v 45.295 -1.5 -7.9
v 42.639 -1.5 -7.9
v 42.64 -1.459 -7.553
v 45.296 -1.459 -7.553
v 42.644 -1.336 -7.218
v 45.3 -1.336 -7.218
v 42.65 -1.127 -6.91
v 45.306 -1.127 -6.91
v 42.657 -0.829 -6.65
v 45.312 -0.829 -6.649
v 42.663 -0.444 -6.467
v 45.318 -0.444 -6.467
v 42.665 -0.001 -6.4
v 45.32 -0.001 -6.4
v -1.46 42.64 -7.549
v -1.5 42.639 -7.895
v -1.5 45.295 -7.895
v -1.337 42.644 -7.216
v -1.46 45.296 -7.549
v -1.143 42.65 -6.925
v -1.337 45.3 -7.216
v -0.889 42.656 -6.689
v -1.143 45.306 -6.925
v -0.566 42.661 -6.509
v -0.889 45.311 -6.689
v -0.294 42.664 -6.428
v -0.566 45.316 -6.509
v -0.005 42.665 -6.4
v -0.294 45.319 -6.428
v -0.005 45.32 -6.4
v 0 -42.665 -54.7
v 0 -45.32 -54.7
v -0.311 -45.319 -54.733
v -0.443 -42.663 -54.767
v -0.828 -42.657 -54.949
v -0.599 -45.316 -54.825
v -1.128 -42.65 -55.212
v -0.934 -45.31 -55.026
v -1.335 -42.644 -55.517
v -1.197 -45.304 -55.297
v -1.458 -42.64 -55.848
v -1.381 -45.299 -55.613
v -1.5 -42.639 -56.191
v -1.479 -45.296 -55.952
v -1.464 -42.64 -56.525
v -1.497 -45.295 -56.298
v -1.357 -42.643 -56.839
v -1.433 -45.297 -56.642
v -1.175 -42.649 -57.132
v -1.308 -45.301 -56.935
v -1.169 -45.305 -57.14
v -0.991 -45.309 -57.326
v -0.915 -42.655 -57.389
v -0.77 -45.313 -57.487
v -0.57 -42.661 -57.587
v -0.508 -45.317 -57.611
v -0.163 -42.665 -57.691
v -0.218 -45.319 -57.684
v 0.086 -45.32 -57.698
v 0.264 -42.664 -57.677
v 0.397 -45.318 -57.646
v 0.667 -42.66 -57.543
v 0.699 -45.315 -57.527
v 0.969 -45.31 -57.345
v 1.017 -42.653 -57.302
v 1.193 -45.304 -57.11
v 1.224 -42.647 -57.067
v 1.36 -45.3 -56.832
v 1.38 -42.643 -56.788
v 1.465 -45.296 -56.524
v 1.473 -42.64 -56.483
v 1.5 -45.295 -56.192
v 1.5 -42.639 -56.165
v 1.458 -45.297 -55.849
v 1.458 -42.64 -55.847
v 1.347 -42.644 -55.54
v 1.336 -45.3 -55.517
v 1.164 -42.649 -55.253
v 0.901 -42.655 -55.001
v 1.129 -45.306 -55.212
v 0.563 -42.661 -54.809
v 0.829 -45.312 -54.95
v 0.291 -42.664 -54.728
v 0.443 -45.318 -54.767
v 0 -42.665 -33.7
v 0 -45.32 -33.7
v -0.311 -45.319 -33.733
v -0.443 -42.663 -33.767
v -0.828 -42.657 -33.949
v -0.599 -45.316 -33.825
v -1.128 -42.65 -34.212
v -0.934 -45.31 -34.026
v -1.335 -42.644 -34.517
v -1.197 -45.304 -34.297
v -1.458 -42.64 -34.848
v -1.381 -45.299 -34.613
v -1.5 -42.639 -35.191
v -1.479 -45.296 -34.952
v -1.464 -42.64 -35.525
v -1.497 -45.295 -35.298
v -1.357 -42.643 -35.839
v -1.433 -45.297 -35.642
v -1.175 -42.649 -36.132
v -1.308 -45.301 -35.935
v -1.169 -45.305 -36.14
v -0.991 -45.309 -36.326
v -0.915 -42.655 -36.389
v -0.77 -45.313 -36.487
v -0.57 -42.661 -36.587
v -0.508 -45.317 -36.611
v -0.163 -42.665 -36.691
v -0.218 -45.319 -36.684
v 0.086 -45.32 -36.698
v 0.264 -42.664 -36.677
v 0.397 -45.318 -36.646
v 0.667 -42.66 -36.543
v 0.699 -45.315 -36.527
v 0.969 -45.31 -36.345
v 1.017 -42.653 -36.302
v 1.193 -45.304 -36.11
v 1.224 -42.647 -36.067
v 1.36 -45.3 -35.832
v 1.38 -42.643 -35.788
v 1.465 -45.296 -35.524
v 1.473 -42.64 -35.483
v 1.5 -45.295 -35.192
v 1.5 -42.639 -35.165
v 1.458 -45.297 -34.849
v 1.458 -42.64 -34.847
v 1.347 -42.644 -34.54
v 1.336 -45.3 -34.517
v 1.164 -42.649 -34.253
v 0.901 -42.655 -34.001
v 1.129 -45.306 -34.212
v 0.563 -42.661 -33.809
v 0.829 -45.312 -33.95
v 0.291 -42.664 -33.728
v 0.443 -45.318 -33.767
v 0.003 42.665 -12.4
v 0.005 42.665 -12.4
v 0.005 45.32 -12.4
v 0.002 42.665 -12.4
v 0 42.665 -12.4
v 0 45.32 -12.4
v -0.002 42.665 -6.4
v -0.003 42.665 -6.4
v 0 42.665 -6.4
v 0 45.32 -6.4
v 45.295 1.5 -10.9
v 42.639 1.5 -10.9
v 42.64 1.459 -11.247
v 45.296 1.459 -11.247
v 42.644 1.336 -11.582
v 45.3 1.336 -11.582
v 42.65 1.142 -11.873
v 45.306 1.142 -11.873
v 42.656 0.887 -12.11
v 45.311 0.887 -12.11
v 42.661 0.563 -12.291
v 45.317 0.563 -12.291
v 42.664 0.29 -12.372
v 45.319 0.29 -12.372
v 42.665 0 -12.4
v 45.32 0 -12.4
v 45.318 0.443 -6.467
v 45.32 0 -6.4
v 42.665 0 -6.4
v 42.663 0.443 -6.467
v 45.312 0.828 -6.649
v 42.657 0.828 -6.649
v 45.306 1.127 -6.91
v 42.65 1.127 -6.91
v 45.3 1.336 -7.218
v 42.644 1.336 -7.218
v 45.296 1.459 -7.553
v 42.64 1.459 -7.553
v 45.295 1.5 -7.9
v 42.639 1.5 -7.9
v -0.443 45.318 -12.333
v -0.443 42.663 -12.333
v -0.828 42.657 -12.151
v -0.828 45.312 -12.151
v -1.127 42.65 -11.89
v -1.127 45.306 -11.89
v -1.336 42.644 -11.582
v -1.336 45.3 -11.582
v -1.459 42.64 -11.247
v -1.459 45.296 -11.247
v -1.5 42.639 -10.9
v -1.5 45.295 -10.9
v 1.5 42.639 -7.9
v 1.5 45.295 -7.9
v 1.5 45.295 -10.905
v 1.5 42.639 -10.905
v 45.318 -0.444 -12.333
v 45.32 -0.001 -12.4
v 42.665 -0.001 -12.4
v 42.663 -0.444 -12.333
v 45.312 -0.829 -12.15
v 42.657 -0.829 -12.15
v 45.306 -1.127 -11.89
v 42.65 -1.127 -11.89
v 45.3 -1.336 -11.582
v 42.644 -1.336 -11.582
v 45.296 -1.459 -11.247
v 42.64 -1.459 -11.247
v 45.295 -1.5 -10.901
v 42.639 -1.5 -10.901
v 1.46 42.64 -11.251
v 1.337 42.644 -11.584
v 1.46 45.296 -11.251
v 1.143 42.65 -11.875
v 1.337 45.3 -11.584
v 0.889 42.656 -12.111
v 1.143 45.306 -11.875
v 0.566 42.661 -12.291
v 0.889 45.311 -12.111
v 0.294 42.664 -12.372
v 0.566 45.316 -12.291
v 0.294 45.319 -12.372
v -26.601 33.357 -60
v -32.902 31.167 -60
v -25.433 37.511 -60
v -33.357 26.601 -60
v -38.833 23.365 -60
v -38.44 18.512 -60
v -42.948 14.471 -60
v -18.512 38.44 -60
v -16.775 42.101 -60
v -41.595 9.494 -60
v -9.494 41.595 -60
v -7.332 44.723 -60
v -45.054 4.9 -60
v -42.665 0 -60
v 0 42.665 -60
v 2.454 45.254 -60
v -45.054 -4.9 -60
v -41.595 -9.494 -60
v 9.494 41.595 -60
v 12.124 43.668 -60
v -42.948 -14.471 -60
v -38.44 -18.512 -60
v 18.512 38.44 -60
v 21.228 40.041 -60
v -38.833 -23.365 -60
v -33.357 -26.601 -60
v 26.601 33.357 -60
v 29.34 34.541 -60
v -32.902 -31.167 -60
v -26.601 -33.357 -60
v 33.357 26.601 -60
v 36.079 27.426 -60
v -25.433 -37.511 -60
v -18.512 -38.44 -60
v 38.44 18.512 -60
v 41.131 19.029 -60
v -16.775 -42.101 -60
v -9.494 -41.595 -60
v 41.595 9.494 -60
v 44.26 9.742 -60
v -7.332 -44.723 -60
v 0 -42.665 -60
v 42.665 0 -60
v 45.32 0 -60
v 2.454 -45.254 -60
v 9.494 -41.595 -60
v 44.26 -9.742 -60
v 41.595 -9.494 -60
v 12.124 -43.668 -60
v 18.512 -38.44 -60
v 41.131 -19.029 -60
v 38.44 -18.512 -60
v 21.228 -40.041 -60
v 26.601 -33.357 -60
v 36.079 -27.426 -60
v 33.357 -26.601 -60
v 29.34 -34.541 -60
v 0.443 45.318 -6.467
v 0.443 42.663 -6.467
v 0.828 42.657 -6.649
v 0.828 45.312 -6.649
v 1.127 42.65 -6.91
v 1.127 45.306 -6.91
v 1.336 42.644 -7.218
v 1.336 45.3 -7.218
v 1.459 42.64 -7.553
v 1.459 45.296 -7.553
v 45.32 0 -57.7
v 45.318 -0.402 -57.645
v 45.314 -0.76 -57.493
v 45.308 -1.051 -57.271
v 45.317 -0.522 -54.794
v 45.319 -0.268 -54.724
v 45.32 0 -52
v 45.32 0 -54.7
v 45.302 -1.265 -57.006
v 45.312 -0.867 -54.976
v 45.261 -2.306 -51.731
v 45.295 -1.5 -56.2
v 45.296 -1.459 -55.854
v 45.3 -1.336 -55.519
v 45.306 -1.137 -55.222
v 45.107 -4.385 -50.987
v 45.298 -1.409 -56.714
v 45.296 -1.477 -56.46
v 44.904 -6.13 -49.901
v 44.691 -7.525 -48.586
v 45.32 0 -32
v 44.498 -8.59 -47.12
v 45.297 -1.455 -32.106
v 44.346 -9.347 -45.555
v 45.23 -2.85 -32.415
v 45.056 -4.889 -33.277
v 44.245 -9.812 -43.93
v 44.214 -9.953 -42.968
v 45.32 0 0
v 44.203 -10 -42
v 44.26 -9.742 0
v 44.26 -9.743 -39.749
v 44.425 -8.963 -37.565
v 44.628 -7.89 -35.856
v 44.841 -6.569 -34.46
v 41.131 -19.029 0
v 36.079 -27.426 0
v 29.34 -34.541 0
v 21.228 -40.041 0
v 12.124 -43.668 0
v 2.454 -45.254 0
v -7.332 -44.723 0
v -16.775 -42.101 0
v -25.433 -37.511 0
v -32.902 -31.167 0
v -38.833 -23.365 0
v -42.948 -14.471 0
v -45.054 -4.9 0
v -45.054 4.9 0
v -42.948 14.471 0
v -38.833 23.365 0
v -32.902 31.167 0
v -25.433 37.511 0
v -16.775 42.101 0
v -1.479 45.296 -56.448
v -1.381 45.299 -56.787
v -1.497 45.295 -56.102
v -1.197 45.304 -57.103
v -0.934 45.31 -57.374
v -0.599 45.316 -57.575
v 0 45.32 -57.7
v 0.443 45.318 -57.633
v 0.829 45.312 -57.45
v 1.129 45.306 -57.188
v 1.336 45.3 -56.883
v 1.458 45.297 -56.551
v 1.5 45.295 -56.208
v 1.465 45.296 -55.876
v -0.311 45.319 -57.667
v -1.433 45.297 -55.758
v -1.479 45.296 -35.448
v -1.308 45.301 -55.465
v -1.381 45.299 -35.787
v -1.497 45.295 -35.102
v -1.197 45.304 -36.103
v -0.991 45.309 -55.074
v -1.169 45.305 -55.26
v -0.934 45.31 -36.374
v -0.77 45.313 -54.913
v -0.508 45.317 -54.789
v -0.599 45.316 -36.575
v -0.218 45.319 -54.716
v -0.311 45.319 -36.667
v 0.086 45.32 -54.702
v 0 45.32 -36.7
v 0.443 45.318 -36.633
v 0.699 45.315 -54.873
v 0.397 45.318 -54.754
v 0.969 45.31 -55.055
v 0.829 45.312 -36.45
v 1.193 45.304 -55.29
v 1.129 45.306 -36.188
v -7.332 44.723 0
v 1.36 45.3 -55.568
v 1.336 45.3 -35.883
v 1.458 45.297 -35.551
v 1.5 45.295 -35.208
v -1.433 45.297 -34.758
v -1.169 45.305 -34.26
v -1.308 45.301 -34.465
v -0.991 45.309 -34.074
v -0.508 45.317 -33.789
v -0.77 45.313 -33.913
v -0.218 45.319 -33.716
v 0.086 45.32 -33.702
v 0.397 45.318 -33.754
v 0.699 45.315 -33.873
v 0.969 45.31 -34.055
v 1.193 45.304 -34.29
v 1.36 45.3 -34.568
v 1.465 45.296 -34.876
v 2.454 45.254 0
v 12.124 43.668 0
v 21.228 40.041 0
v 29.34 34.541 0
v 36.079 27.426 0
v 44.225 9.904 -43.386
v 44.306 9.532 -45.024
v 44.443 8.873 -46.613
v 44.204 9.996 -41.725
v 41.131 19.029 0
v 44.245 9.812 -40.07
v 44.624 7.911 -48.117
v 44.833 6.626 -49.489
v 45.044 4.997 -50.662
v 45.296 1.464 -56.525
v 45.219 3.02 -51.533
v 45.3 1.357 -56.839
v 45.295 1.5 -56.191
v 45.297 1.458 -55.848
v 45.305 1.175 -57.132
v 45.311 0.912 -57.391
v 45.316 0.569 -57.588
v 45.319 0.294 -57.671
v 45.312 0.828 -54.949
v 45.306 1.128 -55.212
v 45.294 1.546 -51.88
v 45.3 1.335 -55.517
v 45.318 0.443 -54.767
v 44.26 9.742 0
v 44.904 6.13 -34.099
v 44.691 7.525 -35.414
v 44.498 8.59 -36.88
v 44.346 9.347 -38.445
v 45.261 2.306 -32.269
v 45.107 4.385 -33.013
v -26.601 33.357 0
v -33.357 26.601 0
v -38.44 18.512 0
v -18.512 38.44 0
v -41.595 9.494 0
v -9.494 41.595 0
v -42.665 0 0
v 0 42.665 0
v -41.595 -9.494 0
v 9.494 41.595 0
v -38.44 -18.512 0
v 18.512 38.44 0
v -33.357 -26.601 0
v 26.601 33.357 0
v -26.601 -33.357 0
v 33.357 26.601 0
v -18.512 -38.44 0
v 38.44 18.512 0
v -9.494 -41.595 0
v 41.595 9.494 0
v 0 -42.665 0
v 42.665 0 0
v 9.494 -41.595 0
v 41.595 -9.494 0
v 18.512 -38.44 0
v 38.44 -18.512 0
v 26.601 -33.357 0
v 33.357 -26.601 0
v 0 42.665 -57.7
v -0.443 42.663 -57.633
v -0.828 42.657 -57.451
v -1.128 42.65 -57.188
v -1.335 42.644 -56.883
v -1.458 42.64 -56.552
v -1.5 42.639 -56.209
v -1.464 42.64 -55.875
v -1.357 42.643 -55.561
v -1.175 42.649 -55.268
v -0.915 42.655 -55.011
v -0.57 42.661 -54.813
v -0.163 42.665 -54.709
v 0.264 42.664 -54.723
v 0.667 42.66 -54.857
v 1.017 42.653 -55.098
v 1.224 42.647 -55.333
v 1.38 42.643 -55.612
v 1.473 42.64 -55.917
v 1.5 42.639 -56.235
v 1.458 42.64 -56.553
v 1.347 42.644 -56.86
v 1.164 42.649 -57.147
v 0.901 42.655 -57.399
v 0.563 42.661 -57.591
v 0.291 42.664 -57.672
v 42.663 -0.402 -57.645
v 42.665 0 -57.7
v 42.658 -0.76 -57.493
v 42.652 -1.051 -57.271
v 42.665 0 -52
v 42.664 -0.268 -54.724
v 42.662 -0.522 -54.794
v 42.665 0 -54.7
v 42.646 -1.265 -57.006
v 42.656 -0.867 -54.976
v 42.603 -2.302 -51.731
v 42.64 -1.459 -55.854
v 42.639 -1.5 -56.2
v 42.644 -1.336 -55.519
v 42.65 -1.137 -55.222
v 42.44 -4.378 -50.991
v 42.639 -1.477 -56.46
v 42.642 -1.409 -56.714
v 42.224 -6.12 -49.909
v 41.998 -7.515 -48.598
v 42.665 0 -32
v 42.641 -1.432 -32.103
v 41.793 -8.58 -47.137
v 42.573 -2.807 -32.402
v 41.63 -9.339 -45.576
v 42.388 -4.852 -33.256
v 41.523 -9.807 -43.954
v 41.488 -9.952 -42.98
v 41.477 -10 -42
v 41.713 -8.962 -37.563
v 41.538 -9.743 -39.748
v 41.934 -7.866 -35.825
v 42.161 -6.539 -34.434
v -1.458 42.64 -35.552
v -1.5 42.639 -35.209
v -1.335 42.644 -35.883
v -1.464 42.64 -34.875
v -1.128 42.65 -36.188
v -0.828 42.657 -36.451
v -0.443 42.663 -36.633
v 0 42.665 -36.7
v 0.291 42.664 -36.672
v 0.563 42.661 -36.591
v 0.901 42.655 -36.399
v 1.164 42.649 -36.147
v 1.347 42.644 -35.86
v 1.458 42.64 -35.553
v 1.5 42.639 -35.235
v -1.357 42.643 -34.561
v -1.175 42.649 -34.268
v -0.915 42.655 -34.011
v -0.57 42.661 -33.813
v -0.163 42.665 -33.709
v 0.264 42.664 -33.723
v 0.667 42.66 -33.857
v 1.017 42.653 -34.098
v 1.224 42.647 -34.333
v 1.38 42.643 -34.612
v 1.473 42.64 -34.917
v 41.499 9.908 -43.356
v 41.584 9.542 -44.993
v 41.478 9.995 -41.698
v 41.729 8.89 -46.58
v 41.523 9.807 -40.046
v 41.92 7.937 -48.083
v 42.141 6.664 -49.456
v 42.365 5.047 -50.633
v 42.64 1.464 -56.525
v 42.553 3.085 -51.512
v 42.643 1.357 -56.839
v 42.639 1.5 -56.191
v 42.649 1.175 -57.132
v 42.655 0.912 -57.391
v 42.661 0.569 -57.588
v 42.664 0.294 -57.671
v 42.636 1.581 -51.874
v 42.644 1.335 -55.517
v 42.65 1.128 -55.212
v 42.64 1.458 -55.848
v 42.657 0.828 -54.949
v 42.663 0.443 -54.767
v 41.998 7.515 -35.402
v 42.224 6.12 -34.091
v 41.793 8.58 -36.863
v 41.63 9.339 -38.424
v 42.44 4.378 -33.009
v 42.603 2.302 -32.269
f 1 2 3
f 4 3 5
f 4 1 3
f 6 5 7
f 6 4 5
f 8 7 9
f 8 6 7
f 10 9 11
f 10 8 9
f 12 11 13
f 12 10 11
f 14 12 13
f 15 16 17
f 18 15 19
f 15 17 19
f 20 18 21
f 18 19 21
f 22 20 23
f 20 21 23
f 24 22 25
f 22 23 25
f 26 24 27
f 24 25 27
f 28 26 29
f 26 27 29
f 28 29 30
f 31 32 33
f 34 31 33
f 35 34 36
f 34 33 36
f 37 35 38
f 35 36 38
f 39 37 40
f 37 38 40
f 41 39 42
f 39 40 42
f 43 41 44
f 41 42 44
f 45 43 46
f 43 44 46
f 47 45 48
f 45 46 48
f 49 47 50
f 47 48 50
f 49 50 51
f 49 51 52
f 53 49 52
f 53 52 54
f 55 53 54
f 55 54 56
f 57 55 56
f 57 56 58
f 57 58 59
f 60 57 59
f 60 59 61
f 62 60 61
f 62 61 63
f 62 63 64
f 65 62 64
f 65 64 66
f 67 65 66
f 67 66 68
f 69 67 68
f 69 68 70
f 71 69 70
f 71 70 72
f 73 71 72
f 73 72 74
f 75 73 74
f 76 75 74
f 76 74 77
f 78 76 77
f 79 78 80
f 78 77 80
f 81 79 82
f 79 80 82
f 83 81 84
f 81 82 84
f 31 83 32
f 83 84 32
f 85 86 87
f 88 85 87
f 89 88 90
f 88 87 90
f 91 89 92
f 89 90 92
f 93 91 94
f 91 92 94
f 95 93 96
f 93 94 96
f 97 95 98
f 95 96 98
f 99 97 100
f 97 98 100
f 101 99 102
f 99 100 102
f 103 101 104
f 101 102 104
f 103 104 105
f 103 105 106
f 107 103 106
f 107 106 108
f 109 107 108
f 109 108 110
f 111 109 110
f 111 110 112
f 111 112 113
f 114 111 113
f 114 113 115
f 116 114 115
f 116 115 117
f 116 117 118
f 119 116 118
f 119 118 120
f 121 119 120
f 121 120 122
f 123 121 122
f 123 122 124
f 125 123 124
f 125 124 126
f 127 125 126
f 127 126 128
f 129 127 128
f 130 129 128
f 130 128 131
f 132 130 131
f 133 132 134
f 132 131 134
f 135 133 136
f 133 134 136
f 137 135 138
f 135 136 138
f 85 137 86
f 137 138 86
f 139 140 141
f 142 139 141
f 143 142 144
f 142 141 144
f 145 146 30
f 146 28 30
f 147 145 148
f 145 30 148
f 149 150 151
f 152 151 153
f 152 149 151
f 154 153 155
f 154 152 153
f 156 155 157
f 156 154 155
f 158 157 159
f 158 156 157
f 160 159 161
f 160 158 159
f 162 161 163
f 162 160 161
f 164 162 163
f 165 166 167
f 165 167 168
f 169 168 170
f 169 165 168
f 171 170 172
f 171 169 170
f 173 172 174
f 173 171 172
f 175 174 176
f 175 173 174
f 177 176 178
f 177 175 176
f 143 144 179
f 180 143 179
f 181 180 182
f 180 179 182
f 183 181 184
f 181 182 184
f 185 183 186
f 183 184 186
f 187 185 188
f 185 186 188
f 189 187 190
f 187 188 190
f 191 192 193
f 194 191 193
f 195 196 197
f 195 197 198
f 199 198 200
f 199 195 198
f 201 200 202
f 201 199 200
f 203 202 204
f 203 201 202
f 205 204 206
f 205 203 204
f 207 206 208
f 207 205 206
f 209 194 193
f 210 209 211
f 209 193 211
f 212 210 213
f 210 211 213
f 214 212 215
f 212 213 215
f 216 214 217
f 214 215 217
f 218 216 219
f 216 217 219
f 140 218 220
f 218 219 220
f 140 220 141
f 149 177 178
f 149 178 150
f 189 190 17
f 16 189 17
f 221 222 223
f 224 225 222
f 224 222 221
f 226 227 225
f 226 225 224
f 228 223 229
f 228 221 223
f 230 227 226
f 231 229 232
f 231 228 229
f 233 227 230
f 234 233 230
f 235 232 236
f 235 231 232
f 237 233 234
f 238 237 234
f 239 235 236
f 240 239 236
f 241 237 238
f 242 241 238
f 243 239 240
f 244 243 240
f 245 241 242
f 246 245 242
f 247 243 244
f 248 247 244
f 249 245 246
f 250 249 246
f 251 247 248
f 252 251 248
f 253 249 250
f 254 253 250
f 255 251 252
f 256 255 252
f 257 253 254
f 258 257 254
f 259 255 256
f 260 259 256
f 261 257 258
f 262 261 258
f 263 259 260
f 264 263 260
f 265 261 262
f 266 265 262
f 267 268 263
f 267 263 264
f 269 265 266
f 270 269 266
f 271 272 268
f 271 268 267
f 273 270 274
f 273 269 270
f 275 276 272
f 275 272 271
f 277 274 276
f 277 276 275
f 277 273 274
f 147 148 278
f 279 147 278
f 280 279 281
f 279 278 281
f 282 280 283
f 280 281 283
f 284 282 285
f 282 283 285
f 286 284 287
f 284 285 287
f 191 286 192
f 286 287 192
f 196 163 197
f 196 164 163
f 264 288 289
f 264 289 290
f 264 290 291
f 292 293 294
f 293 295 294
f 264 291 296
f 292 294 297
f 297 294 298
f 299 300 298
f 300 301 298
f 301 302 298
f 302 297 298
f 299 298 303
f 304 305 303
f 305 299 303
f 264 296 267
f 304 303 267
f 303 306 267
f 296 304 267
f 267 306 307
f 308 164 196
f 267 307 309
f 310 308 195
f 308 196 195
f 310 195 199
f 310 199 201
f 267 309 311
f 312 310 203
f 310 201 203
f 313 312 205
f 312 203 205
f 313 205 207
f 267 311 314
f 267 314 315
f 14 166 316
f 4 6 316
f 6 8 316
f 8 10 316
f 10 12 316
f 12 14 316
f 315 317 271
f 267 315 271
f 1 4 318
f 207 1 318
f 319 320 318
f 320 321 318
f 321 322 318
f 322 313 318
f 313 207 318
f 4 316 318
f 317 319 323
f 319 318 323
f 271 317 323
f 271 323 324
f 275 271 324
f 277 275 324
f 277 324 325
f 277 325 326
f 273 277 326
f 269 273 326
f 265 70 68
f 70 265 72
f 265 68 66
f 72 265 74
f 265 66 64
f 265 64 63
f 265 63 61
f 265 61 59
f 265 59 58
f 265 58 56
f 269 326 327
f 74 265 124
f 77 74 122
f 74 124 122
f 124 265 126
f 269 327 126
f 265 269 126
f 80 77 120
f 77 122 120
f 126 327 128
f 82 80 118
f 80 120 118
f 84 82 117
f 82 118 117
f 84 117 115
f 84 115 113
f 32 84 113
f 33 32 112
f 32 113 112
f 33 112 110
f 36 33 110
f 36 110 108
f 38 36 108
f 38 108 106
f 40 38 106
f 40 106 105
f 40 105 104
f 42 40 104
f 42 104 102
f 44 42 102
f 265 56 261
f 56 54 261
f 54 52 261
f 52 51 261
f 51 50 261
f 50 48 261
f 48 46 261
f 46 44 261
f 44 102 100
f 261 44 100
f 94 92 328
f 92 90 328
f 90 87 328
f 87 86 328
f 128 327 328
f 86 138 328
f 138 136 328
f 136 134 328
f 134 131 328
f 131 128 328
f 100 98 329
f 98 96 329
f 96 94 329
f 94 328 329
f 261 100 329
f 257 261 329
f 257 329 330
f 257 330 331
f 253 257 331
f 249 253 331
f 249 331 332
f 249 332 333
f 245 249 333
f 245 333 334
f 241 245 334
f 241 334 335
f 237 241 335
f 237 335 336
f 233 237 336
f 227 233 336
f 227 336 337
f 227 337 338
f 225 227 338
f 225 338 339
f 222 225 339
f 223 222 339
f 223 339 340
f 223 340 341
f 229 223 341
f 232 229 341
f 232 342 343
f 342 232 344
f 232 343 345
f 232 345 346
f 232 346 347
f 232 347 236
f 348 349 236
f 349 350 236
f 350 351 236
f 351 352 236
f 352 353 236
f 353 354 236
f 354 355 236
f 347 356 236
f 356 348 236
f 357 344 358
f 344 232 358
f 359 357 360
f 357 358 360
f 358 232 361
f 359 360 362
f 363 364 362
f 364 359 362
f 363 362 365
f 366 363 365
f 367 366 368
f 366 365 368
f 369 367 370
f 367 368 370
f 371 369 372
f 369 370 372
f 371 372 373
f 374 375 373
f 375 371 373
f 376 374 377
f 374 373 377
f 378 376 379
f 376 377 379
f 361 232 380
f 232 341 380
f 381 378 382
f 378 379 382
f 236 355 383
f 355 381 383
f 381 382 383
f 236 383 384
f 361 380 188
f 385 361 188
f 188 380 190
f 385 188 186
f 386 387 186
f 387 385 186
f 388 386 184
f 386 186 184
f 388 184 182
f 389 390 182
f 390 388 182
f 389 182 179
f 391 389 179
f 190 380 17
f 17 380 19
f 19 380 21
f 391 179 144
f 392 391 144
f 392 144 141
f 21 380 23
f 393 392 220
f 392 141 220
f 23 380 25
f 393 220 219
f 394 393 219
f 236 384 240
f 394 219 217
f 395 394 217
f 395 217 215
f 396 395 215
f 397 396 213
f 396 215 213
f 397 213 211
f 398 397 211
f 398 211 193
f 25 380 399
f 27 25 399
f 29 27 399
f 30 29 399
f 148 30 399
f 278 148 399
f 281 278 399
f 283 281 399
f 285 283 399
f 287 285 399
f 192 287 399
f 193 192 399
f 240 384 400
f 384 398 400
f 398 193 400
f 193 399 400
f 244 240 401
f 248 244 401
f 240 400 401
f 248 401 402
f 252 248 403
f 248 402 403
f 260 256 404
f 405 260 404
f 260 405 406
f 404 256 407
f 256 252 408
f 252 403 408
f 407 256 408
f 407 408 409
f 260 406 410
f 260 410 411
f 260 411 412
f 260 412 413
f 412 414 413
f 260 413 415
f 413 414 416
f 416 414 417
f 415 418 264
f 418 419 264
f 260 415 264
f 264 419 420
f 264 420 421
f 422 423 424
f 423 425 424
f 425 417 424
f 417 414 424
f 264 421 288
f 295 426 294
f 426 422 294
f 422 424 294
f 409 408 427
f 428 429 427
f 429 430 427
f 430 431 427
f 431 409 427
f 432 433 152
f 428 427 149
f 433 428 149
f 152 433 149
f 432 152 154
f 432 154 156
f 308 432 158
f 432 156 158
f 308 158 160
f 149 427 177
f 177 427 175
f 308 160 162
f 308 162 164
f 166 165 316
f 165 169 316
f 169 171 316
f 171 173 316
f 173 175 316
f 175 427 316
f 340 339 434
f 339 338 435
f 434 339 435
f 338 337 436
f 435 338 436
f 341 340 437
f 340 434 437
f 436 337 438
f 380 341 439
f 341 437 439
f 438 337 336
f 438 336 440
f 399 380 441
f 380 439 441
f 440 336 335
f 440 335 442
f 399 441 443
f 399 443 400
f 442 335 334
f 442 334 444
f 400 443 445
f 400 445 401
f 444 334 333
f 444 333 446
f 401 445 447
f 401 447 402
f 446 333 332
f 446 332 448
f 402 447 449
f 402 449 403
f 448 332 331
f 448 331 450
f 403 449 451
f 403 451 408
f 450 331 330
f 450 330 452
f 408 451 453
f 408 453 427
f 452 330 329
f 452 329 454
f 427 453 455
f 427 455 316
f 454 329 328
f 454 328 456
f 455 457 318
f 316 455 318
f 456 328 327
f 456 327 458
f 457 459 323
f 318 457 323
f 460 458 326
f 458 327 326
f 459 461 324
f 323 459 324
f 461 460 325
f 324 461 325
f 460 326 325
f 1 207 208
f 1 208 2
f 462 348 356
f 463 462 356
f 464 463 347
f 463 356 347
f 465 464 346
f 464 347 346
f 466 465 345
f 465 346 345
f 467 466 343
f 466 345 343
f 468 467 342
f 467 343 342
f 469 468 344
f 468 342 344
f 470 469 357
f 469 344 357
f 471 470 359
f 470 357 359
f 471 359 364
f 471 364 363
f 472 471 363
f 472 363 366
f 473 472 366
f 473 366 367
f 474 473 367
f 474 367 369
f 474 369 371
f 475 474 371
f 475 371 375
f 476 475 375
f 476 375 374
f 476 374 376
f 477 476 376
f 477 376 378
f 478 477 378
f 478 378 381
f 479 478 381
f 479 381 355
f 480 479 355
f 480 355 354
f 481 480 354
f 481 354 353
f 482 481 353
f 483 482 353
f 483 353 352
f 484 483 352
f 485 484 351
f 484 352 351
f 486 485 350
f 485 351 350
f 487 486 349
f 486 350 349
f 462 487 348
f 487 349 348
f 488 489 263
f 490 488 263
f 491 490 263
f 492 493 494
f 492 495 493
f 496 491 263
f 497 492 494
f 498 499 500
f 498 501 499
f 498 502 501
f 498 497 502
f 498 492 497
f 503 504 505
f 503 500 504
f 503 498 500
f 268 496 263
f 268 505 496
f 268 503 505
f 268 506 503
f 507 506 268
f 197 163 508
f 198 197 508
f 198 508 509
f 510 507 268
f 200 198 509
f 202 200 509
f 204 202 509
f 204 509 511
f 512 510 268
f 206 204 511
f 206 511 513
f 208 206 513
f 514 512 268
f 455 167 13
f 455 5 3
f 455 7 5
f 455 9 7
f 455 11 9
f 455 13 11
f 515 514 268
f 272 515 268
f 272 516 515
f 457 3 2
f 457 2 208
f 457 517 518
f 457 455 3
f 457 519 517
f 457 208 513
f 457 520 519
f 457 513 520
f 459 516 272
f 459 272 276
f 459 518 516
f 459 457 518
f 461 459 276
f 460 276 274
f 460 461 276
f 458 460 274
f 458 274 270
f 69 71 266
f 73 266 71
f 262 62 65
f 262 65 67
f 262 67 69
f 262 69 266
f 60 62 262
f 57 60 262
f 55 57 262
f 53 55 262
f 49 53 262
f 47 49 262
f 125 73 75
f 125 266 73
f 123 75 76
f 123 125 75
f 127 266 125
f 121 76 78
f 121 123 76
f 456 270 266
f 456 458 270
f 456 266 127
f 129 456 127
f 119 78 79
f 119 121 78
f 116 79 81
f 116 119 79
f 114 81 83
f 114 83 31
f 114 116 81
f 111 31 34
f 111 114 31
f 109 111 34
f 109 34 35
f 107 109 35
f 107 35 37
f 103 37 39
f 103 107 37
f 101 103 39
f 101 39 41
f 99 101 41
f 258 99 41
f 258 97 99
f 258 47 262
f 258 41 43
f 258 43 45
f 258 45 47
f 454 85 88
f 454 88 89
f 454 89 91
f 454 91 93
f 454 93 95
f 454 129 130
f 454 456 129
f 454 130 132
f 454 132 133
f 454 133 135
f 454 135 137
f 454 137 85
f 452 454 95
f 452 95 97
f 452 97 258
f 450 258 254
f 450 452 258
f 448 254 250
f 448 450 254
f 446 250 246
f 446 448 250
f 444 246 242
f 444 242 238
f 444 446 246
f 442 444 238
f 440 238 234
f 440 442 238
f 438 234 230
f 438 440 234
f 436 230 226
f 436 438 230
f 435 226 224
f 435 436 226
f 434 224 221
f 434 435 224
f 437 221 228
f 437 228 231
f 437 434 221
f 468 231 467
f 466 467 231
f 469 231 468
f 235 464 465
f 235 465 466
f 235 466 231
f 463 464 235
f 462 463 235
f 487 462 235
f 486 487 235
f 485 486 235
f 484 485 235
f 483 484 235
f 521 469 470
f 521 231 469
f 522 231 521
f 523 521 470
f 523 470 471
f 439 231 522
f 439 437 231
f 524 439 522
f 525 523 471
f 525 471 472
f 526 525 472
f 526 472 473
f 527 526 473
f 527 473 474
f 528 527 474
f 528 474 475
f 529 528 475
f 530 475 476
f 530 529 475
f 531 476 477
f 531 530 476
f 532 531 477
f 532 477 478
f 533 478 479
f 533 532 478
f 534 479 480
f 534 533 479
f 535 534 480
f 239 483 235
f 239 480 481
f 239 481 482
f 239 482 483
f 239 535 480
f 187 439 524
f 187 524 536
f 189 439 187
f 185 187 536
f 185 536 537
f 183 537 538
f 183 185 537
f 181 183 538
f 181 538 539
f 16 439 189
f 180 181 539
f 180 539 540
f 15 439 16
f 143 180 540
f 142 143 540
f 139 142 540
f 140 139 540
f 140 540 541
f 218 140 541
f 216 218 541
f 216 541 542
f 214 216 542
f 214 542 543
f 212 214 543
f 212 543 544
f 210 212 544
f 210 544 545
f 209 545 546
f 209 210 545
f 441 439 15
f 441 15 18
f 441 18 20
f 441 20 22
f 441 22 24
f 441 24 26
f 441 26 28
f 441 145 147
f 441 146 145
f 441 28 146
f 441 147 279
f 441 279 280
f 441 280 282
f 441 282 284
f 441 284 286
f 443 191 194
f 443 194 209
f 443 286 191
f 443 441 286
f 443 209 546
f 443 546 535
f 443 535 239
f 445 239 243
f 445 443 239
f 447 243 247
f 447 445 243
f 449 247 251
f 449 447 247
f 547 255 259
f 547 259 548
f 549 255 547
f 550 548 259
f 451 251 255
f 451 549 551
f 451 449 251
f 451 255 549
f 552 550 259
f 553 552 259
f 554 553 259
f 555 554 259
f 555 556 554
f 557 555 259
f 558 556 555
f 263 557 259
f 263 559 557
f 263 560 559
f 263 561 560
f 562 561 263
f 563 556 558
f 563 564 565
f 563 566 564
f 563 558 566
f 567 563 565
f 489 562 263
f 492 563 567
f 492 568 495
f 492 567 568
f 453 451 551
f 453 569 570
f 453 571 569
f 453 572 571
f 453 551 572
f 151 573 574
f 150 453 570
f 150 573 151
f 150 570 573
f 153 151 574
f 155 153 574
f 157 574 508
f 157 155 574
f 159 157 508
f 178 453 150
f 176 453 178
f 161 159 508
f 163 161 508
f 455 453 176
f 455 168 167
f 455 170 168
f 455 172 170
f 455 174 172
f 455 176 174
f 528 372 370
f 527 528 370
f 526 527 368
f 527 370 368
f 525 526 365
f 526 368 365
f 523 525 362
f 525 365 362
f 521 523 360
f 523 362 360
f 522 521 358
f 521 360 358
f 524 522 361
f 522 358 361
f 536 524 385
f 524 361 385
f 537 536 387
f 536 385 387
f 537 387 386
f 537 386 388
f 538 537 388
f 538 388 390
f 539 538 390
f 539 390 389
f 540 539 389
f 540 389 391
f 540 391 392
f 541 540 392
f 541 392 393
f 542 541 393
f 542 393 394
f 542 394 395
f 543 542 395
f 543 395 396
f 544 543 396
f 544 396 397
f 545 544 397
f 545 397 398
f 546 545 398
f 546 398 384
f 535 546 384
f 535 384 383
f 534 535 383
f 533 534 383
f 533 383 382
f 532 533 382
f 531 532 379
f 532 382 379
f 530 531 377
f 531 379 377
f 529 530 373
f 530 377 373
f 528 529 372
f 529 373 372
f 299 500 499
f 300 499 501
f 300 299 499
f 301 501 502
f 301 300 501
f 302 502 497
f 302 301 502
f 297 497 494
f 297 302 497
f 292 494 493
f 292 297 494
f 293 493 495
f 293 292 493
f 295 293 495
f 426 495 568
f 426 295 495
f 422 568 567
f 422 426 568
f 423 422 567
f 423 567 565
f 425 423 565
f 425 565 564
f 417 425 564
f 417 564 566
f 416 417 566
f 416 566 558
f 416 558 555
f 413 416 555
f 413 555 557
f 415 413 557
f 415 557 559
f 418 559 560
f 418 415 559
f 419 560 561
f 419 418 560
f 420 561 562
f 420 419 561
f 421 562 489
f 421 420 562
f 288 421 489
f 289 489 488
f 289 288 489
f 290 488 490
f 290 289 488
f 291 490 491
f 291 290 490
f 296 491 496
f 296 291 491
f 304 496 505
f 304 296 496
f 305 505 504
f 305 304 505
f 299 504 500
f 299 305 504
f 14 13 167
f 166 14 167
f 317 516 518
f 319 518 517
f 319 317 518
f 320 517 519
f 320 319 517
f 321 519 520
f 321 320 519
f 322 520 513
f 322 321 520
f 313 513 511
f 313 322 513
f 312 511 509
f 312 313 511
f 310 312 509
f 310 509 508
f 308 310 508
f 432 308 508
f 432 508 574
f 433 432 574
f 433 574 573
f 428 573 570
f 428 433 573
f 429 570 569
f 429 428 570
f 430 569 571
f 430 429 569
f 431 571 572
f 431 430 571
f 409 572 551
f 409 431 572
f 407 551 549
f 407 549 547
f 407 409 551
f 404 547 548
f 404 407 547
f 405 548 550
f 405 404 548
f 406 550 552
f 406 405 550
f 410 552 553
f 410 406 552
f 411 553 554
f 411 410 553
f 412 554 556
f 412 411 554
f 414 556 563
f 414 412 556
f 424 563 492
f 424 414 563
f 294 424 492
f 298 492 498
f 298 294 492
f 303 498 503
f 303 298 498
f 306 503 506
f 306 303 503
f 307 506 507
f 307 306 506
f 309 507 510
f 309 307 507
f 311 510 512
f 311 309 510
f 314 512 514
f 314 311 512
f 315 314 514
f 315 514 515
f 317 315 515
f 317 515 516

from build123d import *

# Parameters (mm, degrees)
SKETCH_R             = 45.32
SKETCH_R_2           = 42.665
PAD_DEPTH            = 60
SKETCH002_R          = 1.5
SKETCH002_R_2        = 10
POCKET_DEPTH         = 8
SKETCH003_R          = 1.5
POCKET001_DEPTH      = 8
SKETCH004_R          = 1.5
POCKET002_DEPTH      = 5
BODY_PLACEMENT_ANGLE = 180


with BuildPart() as part:
    # Sketch → Pad (new body)
    with BuildSketch(Plane.XY):
        Circle(SKETCH_R)
        Circle(SKETCH_R_2, mode=Mode.SUBTRACT)
    extrude(amount=PAD_DEPTH)

    # Sketch002 (on DatumPlane) → Pocket (cut)
    with BuildSketch(Plane(origin=(45.32, 0, 60), x_dir=(0, 1, 0), z_dir=(-1, 0, 0))):
        with Locations((0, 3.8)):
            Circle(SKETCH002_R)
        with Locations((0, 18)):
            Circle(SKETCH002_R_2)
        with BuildLine():
            Line((0, 47.6), (0.0005, 47.6))
            ThreePointArc((0.0005, 47.6), (1.060807, 48.039193), (1.5, 49.0995))
            Line((1.5, 49.0995), (1.5, 52.1005))
            ThreePointArc((1.5, 52.1005), (1.060807, 53.160807), (0.0005, 53.6))
            Line((0.0005, 53.6), (0, 53.6))
            ThreePointArc((0, 53.6), (-1.06066, 53.16066), (-1.5, 52.1))
            Line((-1.5, 52.1), (-1.5, 49.1))
            ThreePointArc((-1.5, 49.1), (-1.06066, 48.03934), (0, 47.6))
        make_face()
    extrude(amount=POCKET_DEPTH, mode=Mode.SUBTRACT)

    # Sketch003 (on DatumPlane) → Pocket001 (cut)
    with BuildSketch(Plane(origin=(0, 45.32, 60), x_dir=(0, 0, -1), z_dir=(0, 1, 0))):
        with Locations((3.8, 0)):
            Circle(SKETCH003_R)
        with Locations((24.8, 0)):
            Circle(SKETCH003_R)
    extrude(amount=-POCKET001_DEPTH, mode=Mode.SUBTRACT)

    # Sketch004 (on DatumPlane) → Pocket002 (cut)
    with BuildSketch(Plane(origin=(0, -45.32, 60), x_dir=(0, 0, 1), z_dir=(0, -1, 0))):
        with Locations((-3.8, 0)):
            Circle(SKETCH004_R)
        with Locations((-24.8, 0)):
            Circle(SKETCH004_R)
        with BuildLine():
            Line((-52.1, -1.5), (-49.095, -1.5))
            ThreePointArc((-49.095, -1.5), (-48.037875, -1.062125), (-47.6, -0.005))
            Line((-47.6, -0.005), (-47.6, 0))
            ThreePointArc((-47.6, 0), (-48.03934, 1.06066), (-49.1, 1.5))
            Line((-49.1, 1.5), (-52.105, 1.5))
            ThreePointArc((-52.105, 1.5), (-53.162125, 1.062125), (-53.6, 0.005))
            Line((-53.6, 0.005), (-53.6, 0))
            ThreePointArc((-53.6, 0), (-53.16066, -1.06066), (-52.1, -1.5))
        make_face()
    extrude(amount=-POCKET002_DEPTH, mode=Mode.SUBTRACT)


with BuildPart() as part_1:
    # Body placement: moved
    add(part.part.rotate(Axis((0, 0, 0), (1, 0, 0)), BODY_PLACEMENT_ANGLE))


solid = part_1.part
